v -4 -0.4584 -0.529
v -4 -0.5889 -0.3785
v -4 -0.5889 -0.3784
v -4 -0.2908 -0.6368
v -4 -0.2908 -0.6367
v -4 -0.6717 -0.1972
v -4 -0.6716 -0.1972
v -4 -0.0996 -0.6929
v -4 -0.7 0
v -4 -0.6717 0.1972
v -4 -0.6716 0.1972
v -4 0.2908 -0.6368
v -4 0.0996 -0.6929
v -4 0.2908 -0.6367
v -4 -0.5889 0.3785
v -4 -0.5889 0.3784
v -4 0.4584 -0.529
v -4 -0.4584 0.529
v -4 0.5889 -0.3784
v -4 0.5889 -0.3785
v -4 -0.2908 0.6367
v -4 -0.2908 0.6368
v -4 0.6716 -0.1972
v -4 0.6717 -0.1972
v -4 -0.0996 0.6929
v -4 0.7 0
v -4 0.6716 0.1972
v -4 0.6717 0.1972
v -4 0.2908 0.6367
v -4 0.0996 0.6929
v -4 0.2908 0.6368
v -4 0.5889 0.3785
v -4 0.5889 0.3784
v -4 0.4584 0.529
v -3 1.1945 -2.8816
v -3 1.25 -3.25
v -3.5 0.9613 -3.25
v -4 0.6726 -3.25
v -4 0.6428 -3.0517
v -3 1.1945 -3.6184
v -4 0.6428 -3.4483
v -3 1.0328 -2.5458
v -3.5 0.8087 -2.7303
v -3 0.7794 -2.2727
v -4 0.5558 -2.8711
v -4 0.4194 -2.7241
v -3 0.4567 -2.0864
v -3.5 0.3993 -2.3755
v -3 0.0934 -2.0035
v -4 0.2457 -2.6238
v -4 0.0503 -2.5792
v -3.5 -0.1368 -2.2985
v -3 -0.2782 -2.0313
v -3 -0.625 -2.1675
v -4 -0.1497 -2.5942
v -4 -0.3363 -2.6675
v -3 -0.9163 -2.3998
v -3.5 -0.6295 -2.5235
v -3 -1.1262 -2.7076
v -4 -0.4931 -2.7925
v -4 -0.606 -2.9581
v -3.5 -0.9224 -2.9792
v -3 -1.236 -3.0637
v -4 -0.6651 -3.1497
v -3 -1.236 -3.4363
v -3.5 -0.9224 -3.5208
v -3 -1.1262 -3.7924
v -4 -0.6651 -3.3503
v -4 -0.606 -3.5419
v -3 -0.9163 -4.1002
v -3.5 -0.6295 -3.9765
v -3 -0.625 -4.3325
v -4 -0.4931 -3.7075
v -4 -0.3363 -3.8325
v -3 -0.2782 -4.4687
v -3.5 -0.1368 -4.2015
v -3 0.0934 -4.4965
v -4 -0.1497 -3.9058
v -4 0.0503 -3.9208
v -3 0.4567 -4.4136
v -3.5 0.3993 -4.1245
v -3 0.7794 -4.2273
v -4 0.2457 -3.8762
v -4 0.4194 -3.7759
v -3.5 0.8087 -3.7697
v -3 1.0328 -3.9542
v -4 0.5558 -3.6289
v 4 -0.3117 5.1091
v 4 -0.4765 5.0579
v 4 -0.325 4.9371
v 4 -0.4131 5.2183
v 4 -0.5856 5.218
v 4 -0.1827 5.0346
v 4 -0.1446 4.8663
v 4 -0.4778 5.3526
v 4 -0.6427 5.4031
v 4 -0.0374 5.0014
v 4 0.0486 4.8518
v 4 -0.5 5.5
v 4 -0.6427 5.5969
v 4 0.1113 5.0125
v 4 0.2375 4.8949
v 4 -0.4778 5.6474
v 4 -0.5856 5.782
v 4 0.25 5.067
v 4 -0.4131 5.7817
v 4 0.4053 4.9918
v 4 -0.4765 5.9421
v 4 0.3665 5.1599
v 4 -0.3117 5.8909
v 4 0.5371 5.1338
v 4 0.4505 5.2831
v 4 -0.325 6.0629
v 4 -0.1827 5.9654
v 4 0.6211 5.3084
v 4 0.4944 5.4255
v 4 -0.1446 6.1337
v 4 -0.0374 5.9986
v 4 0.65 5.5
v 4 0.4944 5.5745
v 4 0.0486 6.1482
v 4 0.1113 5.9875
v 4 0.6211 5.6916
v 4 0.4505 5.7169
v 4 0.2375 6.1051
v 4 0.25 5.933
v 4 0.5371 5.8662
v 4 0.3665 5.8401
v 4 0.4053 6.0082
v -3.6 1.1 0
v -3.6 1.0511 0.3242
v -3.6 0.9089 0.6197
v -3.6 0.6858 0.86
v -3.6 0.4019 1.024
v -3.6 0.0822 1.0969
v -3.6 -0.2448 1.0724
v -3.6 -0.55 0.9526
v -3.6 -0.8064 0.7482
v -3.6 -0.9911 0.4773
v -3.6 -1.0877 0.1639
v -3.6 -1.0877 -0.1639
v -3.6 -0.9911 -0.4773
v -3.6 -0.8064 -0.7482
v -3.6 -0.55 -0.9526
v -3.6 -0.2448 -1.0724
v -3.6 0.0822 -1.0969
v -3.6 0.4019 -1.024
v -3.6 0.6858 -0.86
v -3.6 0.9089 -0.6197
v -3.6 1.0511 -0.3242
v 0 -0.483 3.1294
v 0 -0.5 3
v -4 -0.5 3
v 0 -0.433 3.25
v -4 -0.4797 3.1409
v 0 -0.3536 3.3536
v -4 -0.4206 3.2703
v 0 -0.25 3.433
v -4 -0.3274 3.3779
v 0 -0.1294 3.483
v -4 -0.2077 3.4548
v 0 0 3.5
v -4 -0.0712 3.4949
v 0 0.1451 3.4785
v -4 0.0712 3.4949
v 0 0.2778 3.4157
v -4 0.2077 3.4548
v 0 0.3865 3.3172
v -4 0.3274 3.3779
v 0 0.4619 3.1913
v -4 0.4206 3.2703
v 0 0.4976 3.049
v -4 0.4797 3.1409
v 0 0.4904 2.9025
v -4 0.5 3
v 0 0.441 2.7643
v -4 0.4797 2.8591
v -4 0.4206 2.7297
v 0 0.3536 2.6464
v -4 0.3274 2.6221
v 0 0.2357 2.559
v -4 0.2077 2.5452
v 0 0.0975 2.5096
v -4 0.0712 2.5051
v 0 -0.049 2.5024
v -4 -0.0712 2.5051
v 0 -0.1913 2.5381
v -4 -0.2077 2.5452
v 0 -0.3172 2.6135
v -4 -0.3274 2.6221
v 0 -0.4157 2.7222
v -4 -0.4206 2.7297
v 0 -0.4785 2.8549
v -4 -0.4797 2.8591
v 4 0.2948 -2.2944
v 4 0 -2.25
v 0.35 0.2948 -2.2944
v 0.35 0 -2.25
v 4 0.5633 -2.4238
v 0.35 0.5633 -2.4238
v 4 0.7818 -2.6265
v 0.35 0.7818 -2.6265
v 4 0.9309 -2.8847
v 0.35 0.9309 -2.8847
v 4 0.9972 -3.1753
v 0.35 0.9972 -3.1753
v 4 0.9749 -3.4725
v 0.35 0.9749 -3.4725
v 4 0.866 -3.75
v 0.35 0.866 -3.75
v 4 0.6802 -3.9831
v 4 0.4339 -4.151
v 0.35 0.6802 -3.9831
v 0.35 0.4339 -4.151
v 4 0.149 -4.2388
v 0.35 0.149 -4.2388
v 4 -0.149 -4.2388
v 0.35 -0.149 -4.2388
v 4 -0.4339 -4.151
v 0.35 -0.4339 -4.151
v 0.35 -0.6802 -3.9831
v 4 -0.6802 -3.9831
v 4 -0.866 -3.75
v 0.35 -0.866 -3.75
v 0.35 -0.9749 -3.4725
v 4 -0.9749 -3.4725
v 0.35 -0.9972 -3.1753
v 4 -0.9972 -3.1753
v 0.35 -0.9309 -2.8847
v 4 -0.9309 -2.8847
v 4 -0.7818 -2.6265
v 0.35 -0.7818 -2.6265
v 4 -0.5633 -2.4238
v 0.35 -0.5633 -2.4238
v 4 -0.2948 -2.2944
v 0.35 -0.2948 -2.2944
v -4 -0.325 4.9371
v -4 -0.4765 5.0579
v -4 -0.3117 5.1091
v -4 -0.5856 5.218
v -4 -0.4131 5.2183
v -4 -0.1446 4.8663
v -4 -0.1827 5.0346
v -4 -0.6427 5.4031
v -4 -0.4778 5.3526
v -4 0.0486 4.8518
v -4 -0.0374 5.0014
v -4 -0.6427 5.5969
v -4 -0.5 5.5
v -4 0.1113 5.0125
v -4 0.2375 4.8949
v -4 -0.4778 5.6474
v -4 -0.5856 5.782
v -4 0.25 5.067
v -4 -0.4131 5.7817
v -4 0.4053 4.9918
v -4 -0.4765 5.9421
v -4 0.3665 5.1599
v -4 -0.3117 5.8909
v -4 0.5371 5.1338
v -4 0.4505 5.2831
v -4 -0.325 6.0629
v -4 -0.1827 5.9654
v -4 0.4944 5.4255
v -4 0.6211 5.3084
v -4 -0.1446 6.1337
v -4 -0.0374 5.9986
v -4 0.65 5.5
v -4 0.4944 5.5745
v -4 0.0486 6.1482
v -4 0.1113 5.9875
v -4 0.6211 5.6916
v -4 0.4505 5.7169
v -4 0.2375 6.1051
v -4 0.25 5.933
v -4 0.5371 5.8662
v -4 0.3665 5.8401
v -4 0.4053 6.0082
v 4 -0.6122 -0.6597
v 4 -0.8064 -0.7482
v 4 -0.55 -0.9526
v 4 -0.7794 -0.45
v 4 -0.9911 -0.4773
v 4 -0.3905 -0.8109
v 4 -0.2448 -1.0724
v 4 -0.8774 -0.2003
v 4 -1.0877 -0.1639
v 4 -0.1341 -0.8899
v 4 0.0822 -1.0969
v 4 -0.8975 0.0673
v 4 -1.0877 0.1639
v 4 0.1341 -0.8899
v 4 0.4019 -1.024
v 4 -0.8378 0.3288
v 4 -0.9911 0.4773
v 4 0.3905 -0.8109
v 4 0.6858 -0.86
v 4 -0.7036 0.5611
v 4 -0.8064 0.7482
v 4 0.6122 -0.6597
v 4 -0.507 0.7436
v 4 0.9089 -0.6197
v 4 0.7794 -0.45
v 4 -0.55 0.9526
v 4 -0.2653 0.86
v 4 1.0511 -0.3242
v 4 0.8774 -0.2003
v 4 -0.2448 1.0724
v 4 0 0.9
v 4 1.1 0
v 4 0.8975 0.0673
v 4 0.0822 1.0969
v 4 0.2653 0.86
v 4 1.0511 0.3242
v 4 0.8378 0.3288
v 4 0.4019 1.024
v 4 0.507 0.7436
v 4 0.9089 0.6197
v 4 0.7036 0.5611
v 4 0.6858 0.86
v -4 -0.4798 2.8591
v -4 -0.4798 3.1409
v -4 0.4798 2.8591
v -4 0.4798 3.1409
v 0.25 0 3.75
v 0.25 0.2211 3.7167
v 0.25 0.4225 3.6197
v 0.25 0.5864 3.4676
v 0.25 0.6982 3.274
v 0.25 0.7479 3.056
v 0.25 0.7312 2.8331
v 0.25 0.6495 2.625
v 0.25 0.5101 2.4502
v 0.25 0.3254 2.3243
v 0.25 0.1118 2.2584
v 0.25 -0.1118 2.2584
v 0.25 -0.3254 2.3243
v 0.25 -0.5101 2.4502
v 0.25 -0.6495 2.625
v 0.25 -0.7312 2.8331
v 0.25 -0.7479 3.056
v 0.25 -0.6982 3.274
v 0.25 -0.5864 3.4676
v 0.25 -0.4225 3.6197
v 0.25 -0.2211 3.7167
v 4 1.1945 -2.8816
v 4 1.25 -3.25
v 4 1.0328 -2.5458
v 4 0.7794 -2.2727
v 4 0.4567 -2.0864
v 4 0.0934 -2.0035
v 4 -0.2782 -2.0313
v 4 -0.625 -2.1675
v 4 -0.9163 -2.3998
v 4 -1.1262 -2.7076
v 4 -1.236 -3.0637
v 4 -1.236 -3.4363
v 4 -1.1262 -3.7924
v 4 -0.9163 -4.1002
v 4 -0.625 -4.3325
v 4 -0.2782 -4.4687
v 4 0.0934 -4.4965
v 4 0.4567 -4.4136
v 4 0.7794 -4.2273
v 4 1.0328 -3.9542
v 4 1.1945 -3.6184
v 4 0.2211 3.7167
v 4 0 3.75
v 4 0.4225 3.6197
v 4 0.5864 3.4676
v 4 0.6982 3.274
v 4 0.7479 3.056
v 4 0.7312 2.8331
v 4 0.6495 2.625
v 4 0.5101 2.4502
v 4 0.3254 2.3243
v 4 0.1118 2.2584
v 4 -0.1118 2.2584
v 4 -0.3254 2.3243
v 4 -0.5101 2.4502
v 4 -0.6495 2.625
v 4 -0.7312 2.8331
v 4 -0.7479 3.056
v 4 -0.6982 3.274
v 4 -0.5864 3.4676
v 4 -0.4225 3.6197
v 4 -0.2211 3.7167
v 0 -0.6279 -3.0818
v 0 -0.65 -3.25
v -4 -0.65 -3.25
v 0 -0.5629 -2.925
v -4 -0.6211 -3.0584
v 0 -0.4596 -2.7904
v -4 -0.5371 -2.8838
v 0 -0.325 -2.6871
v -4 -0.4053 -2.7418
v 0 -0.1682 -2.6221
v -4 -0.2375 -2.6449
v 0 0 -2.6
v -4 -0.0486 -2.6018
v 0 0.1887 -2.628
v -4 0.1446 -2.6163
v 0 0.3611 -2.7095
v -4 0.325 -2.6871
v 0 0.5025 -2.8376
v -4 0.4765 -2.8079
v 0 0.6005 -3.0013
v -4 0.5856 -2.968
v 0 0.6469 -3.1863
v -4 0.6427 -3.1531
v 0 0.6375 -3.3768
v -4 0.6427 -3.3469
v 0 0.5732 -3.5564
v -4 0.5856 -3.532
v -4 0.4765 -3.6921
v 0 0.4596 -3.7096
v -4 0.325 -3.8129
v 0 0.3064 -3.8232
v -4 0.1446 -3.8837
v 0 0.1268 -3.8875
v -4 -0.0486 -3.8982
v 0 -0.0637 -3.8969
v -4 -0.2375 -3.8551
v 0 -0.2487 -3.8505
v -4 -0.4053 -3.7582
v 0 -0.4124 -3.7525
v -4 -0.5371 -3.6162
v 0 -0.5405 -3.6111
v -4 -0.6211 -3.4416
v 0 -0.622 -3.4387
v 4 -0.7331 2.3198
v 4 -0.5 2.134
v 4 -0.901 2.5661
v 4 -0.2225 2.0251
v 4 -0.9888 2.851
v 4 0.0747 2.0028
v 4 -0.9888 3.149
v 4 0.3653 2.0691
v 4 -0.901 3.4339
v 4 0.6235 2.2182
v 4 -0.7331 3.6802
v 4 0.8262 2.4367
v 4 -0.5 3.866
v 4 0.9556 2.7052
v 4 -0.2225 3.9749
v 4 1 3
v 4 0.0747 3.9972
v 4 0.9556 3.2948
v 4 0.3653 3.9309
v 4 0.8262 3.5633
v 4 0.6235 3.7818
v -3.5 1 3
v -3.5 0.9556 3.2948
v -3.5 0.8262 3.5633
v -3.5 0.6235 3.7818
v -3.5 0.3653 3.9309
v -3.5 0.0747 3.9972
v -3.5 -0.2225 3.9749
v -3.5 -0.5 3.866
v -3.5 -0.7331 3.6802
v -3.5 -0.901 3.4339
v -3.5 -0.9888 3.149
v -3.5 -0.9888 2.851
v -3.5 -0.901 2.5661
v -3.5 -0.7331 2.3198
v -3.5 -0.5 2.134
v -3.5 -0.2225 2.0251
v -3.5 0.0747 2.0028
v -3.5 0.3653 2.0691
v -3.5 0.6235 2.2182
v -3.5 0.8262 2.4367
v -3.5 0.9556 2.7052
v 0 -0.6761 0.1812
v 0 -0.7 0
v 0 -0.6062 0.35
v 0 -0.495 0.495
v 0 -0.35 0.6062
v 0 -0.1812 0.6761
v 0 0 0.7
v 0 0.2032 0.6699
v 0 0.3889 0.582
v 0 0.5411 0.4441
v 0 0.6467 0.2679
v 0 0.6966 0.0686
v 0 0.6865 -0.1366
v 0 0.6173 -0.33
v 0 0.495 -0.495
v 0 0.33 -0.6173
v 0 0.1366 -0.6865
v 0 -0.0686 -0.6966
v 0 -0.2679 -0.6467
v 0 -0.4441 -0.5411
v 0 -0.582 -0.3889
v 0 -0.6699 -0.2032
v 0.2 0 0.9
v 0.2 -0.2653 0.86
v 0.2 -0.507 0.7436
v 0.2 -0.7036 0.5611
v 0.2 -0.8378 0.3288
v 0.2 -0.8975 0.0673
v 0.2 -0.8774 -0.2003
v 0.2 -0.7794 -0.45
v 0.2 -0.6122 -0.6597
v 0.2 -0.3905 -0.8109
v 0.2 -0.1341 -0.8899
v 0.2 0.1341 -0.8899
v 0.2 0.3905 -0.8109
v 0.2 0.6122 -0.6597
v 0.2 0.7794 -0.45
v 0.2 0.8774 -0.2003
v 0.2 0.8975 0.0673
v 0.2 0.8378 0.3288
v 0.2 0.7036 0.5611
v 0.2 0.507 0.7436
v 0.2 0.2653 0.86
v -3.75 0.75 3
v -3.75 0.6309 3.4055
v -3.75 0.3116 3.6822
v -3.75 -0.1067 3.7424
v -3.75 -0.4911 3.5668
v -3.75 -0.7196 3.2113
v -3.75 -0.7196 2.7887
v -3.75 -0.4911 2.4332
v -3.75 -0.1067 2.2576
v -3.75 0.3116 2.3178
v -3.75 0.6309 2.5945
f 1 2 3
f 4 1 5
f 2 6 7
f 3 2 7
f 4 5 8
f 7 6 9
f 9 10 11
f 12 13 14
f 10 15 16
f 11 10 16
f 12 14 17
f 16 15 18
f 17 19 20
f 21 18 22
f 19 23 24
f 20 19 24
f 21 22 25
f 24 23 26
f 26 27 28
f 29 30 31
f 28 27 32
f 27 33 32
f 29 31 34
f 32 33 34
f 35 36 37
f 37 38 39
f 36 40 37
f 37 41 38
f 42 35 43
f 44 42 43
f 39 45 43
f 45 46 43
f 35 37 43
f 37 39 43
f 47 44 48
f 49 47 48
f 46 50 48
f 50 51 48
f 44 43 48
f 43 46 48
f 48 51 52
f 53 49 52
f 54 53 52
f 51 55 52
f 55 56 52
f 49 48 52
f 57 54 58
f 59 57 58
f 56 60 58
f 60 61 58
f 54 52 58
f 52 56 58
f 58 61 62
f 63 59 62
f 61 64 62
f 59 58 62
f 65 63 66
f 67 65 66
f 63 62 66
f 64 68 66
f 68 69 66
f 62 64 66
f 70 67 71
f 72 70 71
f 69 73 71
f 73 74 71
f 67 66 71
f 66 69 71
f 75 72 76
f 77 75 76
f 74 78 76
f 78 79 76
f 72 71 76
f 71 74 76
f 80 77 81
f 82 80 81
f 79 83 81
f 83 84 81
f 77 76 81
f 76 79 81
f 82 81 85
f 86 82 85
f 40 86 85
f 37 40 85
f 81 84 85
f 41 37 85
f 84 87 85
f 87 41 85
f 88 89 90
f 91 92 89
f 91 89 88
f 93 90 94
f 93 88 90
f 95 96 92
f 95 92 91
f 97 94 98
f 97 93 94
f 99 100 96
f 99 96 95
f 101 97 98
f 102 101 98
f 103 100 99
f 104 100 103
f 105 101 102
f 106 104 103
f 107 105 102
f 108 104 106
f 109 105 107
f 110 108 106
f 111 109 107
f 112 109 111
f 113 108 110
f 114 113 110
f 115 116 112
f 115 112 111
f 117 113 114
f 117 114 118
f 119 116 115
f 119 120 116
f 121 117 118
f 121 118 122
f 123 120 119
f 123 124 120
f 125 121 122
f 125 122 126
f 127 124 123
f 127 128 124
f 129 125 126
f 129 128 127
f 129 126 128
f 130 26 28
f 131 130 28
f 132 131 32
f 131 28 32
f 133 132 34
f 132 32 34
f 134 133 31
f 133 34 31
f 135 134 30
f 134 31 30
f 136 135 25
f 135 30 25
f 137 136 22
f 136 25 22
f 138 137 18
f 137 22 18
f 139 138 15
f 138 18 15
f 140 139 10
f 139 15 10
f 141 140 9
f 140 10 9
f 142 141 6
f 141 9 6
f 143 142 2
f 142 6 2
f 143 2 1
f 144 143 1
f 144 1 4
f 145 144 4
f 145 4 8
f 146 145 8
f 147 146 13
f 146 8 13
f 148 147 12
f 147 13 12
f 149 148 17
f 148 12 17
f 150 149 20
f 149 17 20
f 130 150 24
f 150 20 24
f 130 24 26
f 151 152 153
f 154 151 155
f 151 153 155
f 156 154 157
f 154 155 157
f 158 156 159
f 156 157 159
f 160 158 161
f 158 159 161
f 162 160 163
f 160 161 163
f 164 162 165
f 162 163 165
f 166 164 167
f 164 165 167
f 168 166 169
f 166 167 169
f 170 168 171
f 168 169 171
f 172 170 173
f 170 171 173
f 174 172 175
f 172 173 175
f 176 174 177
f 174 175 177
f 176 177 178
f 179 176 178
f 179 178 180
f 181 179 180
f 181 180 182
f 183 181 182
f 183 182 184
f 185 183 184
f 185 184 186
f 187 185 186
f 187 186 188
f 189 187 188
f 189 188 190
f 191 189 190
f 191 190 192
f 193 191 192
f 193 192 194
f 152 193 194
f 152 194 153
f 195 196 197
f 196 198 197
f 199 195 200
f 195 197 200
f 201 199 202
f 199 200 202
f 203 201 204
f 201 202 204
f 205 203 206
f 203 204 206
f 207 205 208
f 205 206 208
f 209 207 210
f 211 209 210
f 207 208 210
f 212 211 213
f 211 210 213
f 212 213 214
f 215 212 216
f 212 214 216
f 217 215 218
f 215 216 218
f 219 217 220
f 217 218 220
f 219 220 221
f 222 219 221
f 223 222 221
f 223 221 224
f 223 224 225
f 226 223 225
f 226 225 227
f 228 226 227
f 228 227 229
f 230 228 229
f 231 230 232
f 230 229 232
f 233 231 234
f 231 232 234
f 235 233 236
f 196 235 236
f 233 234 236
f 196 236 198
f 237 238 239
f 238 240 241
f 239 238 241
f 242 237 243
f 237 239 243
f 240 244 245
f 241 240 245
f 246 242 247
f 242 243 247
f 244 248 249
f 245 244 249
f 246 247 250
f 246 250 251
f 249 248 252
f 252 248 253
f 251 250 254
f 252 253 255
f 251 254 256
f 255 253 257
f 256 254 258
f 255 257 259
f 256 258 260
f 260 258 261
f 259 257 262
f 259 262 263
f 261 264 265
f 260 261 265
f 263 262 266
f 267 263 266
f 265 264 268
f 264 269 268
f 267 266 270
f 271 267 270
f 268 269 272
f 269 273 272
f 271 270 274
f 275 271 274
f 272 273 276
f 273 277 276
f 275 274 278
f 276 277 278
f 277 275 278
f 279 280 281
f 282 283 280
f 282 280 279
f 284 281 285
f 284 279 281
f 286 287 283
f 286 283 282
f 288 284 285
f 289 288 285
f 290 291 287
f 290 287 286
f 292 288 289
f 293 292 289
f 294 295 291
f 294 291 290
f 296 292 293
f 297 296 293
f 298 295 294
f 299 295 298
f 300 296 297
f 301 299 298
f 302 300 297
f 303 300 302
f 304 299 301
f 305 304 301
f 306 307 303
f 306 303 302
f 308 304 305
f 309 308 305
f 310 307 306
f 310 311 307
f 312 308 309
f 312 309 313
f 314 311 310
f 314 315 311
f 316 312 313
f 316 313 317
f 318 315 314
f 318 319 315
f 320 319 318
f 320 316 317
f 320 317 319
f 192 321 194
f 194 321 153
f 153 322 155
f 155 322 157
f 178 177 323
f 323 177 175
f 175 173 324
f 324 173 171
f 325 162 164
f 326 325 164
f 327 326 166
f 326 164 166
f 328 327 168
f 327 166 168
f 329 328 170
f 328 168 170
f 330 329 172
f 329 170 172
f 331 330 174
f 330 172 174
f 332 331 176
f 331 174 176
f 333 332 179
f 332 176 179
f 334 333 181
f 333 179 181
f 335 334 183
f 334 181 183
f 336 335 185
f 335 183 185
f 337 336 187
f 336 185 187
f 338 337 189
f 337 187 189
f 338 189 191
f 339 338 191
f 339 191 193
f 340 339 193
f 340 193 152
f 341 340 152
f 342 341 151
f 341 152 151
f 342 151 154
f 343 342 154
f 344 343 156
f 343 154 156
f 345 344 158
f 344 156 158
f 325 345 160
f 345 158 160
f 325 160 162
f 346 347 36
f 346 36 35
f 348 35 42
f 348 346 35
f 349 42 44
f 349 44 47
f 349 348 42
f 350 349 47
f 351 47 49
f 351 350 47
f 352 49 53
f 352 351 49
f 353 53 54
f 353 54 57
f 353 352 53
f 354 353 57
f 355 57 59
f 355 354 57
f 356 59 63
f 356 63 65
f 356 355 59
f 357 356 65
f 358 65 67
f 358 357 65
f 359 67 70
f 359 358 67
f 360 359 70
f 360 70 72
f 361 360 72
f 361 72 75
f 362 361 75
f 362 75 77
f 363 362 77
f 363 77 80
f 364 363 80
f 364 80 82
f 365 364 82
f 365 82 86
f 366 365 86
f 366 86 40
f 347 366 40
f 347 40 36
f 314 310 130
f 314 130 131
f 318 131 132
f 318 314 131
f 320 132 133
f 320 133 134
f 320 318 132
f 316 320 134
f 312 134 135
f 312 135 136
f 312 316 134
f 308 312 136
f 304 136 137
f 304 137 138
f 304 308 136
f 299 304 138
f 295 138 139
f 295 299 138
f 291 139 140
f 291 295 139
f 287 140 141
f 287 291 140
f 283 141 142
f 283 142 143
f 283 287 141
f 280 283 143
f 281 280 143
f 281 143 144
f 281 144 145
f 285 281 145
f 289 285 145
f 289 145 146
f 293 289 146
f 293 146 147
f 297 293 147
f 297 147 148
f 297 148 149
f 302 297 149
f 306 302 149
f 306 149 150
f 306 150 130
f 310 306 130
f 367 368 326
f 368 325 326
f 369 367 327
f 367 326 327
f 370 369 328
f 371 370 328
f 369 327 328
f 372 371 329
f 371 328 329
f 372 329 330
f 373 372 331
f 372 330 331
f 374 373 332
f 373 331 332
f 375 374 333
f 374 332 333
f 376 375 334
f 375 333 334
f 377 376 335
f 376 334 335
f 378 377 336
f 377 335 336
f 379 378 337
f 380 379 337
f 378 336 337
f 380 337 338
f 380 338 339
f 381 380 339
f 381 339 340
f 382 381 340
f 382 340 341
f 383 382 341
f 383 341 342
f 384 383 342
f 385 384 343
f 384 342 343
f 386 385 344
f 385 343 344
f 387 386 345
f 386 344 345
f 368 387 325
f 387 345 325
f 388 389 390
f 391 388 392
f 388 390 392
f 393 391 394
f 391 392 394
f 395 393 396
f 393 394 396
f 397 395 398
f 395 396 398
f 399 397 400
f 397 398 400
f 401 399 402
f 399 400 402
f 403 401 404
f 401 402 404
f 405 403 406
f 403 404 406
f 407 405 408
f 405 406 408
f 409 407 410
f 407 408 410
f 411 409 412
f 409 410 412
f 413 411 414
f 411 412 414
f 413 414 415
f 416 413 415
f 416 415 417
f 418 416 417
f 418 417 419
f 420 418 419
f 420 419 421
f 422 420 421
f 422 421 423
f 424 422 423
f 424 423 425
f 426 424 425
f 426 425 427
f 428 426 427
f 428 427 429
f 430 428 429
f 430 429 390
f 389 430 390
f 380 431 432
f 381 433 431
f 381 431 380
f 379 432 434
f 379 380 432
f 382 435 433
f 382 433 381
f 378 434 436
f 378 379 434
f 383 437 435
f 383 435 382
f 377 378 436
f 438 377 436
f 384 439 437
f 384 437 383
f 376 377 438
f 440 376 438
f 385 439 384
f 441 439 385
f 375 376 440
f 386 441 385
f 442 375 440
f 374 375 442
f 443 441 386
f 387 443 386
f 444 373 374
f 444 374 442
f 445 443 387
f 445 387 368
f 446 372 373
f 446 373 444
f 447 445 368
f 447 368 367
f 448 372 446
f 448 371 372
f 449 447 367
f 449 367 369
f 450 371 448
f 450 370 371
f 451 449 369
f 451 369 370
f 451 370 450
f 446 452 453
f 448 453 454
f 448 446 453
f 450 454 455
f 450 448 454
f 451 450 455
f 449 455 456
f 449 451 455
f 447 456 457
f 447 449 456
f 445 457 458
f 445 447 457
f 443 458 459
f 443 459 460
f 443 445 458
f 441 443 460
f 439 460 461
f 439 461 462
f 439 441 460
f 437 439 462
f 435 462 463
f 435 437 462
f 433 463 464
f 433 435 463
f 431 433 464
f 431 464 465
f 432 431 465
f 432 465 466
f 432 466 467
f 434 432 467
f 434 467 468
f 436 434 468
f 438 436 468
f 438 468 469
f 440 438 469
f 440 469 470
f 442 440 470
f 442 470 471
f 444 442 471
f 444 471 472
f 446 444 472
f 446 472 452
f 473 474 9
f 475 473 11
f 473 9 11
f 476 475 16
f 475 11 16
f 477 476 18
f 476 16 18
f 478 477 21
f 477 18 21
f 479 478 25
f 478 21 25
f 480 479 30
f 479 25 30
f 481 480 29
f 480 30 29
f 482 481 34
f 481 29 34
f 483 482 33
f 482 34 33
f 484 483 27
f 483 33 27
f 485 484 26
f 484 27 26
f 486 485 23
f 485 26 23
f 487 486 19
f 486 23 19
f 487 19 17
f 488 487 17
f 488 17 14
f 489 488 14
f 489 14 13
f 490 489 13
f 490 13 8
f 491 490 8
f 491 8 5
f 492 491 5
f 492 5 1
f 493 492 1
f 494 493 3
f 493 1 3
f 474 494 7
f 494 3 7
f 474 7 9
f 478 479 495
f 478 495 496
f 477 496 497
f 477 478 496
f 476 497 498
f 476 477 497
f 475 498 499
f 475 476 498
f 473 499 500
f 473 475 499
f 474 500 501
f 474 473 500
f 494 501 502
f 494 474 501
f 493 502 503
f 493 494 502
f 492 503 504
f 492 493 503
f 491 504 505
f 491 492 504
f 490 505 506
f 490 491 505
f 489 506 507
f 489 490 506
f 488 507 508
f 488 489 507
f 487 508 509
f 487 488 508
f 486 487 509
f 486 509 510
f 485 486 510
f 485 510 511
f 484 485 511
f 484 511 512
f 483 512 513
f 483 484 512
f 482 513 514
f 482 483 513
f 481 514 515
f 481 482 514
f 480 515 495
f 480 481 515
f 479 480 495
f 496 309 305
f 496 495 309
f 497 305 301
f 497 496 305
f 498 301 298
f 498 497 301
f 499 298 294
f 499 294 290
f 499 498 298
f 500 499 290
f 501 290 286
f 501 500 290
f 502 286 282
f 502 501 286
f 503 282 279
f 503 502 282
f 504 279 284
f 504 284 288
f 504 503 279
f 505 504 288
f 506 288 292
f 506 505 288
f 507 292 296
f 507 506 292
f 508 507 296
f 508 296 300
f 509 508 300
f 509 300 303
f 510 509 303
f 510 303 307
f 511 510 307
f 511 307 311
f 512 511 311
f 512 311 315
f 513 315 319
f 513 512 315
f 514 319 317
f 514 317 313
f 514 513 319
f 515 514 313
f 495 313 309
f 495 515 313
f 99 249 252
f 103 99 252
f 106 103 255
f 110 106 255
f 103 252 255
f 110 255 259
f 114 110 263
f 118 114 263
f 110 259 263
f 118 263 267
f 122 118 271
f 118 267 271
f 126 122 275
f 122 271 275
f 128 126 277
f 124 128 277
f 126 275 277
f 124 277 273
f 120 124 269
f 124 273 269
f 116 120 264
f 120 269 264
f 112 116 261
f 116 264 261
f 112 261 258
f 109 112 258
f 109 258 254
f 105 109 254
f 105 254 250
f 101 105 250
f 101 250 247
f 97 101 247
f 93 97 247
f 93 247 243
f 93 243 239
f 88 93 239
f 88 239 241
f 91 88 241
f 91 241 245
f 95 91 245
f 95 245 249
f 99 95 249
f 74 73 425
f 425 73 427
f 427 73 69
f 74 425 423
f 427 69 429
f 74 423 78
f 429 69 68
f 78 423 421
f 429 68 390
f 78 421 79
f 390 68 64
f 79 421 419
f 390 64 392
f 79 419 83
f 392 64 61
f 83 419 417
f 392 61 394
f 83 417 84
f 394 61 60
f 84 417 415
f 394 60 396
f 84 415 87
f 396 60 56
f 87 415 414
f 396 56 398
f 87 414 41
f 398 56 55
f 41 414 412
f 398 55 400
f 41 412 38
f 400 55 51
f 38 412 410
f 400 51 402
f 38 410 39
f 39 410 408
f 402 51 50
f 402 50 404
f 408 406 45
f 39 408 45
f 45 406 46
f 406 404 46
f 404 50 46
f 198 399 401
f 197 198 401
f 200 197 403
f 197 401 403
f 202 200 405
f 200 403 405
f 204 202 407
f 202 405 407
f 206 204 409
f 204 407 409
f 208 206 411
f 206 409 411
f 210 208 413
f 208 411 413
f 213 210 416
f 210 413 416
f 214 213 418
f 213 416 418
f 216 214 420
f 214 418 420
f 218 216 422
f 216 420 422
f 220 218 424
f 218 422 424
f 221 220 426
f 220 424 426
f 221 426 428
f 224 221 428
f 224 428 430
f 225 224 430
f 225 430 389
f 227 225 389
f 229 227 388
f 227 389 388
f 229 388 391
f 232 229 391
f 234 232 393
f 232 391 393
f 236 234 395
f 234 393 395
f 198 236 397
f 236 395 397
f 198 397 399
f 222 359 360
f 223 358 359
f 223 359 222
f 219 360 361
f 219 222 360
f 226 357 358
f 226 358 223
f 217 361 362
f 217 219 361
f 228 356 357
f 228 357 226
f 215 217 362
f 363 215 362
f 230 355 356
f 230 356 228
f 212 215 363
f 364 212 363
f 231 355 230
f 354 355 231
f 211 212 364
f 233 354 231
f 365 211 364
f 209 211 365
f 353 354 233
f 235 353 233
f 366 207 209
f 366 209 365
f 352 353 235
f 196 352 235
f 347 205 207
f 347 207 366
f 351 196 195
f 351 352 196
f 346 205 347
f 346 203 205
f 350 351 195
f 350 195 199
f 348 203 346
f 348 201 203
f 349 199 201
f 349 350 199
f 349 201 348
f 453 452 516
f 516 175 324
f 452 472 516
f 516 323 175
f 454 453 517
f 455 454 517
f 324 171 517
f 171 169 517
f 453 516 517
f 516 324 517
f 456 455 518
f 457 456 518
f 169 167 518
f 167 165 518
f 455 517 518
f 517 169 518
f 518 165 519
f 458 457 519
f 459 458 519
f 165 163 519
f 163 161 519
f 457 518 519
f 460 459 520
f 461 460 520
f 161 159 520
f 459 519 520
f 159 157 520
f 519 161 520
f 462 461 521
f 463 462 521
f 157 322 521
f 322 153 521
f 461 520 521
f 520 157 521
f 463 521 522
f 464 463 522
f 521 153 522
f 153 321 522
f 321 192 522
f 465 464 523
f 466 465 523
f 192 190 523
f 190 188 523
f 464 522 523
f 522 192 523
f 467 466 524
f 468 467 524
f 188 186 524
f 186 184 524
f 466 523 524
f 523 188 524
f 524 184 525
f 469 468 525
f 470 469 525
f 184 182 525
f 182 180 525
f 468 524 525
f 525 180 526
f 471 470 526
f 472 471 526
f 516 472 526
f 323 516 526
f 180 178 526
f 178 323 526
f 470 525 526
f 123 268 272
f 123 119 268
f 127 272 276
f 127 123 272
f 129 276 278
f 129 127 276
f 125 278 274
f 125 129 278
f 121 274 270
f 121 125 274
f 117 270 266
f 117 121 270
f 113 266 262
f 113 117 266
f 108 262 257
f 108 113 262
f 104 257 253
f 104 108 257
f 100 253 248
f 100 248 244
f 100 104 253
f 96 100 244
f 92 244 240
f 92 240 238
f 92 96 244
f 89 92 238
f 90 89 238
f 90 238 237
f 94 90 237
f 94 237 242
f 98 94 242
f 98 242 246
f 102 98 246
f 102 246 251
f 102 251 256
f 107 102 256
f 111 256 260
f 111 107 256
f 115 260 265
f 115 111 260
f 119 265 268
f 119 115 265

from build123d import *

# Parameters (mm, degrees)
F0_R     = 1.1
F1_DEPTH = 4
F0_R_2   = 1
F0_R_3   = 1.25
F0_R_4   = 0.65
F3_D     = 1
F4_D     = 1.3
F5_D     = 1.4
F6_D     = 1
F7_SIZE2 = 0.39999
F7_SIZE  = 0.39999
F8_SIZE2 = 0.49999
F8_SIZE  = 0.49999
F9_SIZE2 = 0.5773502692
F9_SIZE  = 1


# Not quite as in the source:
# - a fillet or chamfer is up to 0.001 mm smaller than in the source, because OpenCascade refuses the exact size


with BuildPart() as f1:
    # F0 (on Right) → F1 (new body, symmetric)
    with BuildSketch(Plane.YZ):
        Circle(F0_R)
    extrude(amount=F1_DEPTH, both=True)

    # F5 (through all)
    with Locations(Plane.YZ.offset(4)):
        with Locations((0, 0)):
            Hole(F5_D / 2)

    # F7 (size 0.4 and 0.4 in the source; OpenCascade refuses exactly that, so slightly less here)
    f7_edges = [f1.edges().sort_by_distance(p)[0] for p in [
        (-4, -1.1, 0),
    ]]
    chamfer(f7_edges, length=F7_SIZE, length2=F7_SIZE2)

    # F12 (on Front) → F13 (revolve, cut)
    with BuildSketch(Plane.XZ):
        Polygon((0, 0.7), (0, 0), (4, 0), (4, 0.9), (0.2, 0.9), align=None)
    revolve(axis=Axis((2, 0, 0), (1, 0, 0)), mode=Mode.SUBTRACT)


with BuildPart() as f1b:
    # F0 (on Right) → F1, piece 2 (new body, symmetric)
    with BuildSketch(Plane.YZ):
        with Locations((0, 3)):
            Circle(F0_R_2)
    extrude(amount=F1_DEPTH, both=True)

    # F6 (through all)
    with Locations(Plane.YZ.offset(4)):
        with Locations((0, 3)):
            Hole(F6_D / 2)

    # F8 (size 0.5 and 0.5 in the source; OpenCascade refuses exactly that, so slightly less here)
    f8_edges = [f1b.edges().sort_by_distance(p)[0] for p in [
        (-4, -1, 3),
    ]]
    chamfer(f8_edges, length=F8_SIZE, length2=F8_SIZE2)

    # F14 (on Front) → F15 (revolve, cut)
    with BuildSketch(Plane.XZ):
        Polygon((0, 3), (4, 3), (4, 3.75), (0.25, 3.75), (0, 3.5), align=None)
    revolve(axis=Axis((2, 0, 3), (-1, 0, 0)), mode=Mode.SUBTRACT)


with BuildPart() as f1c:
    # F0 (on Right) → F1, piece 3 (new body, symmetric)
    with BuildSketch(Plane.YZ):
        with Locations((0, -3.25)):
            Circle(F0_R_3)
    extrude(amount=F1_DEPTH, both=True)

    # F4 (through all)
    with Locations(Plane.YZ.offset(4)):
        with Locations((0, -3.25)):
            Hole(F4_D / 2)

    # F9
    f9_edges = [f1c.edges().sort_by_distance(p)[0] for p in [
        (-4, -1.25, -3.25),
    ]]
    f9_side = f1c.faces().sort_by_distance((0, -1.25, -3.25))[0]
    chamfer(f9_edges, length=F9_SIZE, length2=F9_SIZE2, reference=f9_side)

    # F10 (on Front) → F11 (revolve, cut)
    with BuildSketch(Plane.XZ):
        Polygon((4, -3.25), (4, -2.25), (0.35, -2.25), (0, -2.6), (0, -3.25), align=None)
    revolve(axis=Axis((2, 0, -3.25), (-1, 0, 0)), mode=Mode.SUBTRACT)


with BuildPart() as f1d:
    # F0 (on Right) → F1, piece 4 (new body, symmetric)
    with BuildSketch(Plane.YZ):
        with Locations((0, 5.5)):
            Circle(F0_R_4)
    extrude(amount=F1_DEPTH, both=True)

    # F3 (through all)
    with Locations(Plane.YZ.offset(4)):
        with Locations((0, 5.5)):
            Hole(F3_D / 2)


solid = Compound([f1.part, f1b.part, f1c.part, f1d.part])
